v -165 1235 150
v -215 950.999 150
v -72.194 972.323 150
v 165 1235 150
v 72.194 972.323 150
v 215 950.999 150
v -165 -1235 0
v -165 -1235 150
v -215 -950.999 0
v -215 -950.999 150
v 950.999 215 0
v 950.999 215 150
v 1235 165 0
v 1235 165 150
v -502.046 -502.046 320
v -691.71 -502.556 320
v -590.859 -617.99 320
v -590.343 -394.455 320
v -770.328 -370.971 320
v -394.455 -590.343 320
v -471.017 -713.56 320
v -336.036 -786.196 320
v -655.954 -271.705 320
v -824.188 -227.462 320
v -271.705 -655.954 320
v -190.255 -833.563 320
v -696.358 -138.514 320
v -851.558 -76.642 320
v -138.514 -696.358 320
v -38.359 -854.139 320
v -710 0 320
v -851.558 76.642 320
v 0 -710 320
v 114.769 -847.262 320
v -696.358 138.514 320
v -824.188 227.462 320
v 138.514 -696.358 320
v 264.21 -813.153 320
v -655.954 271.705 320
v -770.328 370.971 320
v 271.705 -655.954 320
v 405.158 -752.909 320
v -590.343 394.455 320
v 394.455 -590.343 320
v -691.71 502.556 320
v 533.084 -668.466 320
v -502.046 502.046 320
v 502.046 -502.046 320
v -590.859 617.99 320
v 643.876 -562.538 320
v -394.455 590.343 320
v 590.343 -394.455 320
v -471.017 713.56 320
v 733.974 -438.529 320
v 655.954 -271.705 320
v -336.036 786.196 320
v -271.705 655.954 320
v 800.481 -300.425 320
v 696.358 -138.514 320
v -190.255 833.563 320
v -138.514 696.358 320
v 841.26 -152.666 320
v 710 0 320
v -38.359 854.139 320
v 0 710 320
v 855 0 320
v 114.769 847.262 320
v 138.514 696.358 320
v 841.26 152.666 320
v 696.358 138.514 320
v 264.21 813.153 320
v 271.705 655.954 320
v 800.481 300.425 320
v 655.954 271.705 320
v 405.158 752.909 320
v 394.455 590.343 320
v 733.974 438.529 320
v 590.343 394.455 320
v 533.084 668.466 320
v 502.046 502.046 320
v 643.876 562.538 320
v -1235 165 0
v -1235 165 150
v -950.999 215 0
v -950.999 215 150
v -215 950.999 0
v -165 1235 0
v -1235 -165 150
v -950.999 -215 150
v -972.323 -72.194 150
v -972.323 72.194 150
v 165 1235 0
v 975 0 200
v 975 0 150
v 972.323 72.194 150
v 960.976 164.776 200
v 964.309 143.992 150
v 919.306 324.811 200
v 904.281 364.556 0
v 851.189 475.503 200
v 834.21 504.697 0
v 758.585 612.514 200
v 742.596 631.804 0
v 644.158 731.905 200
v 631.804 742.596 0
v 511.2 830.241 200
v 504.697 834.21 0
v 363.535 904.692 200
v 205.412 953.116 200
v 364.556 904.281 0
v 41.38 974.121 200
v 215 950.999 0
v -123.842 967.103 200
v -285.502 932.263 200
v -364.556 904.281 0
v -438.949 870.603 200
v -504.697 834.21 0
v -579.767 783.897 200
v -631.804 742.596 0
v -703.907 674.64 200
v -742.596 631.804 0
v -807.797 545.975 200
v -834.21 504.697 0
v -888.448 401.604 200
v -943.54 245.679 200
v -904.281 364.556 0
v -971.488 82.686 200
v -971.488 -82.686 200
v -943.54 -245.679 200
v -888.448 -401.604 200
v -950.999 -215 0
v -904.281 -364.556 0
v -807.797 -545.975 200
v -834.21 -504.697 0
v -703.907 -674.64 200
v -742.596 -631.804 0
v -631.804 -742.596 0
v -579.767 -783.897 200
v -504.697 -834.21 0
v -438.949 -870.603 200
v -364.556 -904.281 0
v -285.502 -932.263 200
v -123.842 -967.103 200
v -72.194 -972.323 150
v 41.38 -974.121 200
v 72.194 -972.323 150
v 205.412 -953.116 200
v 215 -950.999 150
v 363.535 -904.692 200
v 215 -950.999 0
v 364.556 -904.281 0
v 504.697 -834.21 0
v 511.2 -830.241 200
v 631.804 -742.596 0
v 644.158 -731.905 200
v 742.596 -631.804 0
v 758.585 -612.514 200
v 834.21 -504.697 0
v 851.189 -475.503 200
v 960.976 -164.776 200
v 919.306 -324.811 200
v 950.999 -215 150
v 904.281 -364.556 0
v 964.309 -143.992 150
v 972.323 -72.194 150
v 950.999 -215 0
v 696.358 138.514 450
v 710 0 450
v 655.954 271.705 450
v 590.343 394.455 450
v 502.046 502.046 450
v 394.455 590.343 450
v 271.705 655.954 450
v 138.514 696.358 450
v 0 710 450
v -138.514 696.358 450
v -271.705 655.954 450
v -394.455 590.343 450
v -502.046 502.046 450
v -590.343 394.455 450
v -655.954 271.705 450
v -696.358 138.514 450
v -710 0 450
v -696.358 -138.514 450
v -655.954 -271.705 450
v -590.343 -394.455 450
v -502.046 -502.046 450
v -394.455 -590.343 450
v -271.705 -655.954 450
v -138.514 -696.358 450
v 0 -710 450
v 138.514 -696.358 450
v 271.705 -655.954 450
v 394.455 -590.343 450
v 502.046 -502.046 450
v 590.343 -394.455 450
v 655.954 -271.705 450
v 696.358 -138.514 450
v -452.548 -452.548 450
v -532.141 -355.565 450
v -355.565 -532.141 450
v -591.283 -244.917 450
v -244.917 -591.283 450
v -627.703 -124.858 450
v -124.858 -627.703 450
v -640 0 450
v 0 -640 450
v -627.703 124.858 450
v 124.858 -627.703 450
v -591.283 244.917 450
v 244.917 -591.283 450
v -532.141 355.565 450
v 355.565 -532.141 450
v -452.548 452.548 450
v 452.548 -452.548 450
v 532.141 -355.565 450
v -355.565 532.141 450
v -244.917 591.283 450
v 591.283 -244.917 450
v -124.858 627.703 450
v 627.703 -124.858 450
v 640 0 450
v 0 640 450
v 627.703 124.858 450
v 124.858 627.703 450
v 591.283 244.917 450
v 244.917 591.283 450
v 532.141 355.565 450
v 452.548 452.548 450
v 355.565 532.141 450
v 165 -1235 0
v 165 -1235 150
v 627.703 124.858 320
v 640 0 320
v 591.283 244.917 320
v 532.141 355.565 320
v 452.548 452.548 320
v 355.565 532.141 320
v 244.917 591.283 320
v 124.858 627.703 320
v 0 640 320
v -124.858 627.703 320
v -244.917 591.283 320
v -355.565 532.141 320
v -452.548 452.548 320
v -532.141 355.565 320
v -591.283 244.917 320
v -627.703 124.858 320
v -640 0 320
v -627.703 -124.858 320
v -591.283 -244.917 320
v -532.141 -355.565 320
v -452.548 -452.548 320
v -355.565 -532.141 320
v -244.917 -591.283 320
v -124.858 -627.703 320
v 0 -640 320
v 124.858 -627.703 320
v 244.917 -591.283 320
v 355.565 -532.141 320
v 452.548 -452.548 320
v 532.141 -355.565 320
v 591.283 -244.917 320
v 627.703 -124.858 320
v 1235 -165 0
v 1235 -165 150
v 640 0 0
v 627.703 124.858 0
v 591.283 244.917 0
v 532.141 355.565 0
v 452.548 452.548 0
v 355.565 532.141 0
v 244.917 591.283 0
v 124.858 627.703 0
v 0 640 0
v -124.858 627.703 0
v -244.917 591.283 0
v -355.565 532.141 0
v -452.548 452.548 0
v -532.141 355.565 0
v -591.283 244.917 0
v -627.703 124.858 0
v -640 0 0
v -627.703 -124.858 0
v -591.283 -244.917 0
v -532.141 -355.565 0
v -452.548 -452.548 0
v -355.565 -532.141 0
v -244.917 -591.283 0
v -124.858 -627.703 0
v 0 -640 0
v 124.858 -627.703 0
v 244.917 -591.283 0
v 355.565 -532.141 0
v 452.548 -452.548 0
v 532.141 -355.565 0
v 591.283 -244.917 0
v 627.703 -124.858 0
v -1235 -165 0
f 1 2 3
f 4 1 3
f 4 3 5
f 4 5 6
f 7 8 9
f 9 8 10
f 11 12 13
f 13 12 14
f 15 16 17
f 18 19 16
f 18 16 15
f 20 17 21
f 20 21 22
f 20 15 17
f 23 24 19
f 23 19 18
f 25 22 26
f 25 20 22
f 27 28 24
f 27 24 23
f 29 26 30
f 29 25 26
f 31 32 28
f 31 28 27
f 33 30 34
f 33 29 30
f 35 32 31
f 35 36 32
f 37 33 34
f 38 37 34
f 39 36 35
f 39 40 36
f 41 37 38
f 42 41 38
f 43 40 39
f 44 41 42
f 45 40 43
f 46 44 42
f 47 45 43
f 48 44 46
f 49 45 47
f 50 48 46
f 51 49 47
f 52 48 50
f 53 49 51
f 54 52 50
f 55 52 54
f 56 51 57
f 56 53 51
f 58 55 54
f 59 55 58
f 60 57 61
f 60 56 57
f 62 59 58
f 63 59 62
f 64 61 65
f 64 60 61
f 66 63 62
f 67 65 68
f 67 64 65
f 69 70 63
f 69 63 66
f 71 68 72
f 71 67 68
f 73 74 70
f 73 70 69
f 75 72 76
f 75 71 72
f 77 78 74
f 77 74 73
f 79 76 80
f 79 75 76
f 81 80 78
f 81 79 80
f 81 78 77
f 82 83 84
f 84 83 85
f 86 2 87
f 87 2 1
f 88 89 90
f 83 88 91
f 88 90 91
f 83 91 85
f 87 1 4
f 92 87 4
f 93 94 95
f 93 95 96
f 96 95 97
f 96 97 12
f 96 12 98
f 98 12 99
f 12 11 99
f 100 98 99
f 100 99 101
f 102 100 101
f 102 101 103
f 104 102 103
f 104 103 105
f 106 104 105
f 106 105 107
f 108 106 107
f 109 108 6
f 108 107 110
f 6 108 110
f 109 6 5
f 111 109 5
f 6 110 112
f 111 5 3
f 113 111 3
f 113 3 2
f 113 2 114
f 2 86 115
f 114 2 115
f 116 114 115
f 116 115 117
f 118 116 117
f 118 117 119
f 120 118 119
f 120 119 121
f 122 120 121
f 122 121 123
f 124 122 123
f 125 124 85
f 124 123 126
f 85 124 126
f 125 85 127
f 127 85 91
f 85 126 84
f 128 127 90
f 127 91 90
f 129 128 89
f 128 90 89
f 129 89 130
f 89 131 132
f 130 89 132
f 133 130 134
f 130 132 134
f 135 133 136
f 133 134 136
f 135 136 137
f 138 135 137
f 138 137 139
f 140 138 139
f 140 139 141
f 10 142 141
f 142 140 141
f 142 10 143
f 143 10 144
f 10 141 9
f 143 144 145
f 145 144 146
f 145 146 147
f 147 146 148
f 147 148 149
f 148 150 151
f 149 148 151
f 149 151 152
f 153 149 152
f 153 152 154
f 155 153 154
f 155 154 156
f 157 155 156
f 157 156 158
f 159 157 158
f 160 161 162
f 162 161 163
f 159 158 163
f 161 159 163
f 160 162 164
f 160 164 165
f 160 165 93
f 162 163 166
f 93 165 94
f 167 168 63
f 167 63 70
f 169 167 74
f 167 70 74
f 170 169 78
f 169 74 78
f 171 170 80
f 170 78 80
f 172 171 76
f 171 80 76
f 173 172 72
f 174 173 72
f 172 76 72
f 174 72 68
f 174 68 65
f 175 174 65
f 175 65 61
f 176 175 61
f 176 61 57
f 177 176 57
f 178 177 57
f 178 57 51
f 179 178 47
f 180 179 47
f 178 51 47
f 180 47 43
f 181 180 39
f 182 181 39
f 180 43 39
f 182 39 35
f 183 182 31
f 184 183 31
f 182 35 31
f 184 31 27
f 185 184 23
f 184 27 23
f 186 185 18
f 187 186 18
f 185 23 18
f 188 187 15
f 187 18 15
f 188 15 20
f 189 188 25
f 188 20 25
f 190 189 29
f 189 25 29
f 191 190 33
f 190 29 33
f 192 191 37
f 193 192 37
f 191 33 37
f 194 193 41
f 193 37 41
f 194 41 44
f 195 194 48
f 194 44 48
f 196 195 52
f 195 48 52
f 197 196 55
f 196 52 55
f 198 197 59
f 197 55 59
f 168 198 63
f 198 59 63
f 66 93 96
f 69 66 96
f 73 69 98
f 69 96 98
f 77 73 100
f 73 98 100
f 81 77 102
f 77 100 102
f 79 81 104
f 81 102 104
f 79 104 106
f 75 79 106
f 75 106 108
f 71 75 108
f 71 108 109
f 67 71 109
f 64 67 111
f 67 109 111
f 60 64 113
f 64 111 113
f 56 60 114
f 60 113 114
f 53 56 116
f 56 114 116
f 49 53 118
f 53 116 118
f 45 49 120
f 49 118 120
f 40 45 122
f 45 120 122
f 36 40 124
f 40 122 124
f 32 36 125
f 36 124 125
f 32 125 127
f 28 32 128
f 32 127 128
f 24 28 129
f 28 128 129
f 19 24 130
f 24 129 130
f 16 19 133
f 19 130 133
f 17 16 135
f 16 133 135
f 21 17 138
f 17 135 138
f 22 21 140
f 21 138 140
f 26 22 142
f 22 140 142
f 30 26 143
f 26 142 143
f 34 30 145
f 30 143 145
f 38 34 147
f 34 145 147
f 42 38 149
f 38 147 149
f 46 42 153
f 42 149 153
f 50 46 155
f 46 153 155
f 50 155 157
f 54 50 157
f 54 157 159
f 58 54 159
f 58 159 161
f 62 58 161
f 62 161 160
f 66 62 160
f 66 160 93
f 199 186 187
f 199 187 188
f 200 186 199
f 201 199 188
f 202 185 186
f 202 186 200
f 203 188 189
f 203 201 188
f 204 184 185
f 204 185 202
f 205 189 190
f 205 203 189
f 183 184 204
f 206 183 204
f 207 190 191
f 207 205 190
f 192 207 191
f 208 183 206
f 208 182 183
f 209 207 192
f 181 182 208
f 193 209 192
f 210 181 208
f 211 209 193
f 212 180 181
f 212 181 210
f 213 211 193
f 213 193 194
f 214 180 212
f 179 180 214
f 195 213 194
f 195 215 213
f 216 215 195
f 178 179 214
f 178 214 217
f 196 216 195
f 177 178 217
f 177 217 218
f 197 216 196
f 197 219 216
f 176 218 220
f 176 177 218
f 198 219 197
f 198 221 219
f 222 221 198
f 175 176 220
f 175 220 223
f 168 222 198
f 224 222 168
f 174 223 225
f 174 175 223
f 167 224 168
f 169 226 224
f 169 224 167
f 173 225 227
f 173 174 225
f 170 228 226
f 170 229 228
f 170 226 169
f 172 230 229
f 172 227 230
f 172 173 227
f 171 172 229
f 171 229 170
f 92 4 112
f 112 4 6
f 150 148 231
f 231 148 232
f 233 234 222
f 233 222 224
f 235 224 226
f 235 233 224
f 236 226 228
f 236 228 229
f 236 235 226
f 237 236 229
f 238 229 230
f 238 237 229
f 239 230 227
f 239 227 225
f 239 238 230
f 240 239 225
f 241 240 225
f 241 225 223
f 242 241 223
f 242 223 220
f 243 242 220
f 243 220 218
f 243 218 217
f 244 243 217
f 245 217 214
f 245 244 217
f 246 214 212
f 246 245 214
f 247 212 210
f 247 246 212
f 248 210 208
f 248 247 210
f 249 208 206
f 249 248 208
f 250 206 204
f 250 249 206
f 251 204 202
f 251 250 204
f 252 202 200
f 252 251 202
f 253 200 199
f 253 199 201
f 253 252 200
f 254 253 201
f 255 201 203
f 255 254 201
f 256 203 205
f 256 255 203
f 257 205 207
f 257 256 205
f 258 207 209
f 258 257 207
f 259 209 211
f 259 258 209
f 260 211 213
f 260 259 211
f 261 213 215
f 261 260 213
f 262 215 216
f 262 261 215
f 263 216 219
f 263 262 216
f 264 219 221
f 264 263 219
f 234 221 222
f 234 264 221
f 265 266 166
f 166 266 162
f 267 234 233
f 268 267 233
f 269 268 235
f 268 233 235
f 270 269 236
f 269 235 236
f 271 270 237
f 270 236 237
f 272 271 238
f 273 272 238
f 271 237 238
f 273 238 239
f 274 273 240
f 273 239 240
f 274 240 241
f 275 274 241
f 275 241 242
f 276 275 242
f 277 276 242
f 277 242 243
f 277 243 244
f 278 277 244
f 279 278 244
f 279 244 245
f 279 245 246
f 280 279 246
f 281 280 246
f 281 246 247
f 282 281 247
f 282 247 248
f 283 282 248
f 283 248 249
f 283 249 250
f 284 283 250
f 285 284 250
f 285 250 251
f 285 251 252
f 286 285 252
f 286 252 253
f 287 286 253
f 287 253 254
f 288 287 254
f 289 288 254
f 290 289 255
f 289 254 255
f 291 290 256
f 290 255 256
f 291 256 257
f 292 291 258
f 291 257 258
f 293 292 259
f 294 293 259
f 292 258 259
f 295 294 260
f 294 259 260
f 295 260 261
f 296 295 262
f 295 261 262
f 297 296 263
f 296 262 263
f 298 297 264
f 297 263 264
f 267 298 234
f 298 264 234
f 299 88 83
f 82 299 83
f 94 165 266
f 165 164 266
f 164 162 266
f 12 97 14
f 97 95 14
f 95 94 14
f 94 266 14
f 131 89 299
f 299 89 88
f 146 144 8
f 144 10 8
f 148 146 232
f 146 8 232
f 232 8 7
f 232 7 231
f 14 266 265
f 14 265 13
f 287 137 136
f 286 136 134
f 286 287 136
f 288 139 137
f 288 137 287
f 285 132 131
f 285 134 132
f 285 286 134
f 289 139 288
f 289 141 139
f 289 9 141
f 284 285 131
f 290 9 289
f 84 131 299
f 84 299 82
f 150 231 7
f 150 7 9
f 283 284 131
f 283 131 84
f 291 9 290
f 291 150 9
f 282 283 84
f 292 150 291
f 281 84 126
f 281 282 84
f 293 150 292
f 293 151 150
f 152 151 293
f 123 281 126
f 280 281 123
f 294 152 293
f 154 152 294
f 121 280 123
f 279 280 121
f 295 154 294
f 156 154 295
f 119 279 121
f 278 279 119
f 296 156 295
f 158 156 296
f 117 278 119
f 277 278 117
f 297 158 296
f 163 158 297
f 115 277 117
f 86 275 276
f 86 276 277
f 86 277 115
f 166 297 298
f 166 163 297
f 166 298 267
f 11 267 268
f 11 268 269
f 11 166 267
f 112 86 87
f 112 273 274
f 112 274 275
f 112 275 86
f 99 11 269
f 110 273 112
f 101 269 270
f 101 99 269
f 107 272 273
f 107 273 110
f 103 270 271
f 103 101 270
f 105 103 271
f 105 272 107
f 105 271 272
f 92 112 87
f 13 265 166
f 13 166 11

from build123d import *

# Parameters (mm, degrees)
F0_R      = 975
F1_DEPTH  = 320
F3_R      = 640
F4_DEPTH  = 320.001
F5_W      = 430
F5_H      = 150
F6_DEPTH  = 1235
F7_W      = 430
F7_H      = 150
F8_DEPTH  = 1235
F10_DEPTH = 150.001
F12_DEPTH = 150.001
F14_DEPTH = 150.001
F16_DEPTH = 150.001
F18_R     = 640
F19_DEPTH = 150.001
F20_R     = 710
F20_R_2   = 640
F21_DEPTH = 130
F22_SIZE  = 120


with BuildPart() as f1:
    # F0 (on Top) → F1 (new body)
    with BuildSketch(Plane.XY):
        Circle(F0_R)
    extrude(amount=F1_DEPTH)

    # F3 (on face) → F4 (cut, through all)
    with BuildSketch(Plane.XY.offset(320)):
        Circle(F3_R)
    extrude(amount=-F4_DEPTH, mode=Mode.SUBTRACT)

    # F5 (on Front) → F6 (join, symmetric)
    with BuildSketch(Plane.XZ):
        with Locations((0, 75)):
            Rectangle(F5_W, F5_H)
    extrude(amount=F6_DEPTH, both=True)

    # F7 (on Right) → F8 (join, symmetric)
    with BuildSketch(Plane.YZ):
        with Locations((0, 75)):
            Rectangle(F7_W, F7_H)
    extrude(amount=F8_DEPTH, both=True)

    # F9 (on face) → F10 (cut, through all)
    with BuildSketch(Plane.XY.offset(150)):
        Polygon((1235, -165), (950.999474, -215), (1235, -215), align=None)
        Polygon((950.999474, 215), (1235, 165), (1235, 215), align=None)
    extrude(amount=-F10_DEPTH, mode=Mode.SUBTRACT)

    # F11 (on face) → F12 (cut, through all)
    with BuildSketch(Plane.XY.offset(150)):
        Polygon((-165, -1235), (-215, -950.999474), (-215, -1235), align=None)
        Polygon((215, -950.999474), (165, -1235), (215, -1235), align=None)
    extrude(amount=-F12_DEPTH, mode=Mode.SUBTRACT)

    # F13 (on face) → F14 (cut, through all)
    with BuildSketch(Plane.XY.offset(150)):
        Polygon((215, 1235), (165, 1235), (215, 950.999474), align=None)
        Polygon((-215, 1235), (-215, 950.999474), (-165, 1235), align=None)
    extrude(amount=-F14_DEPTH, mode=Mode.SUBTRACT)

    # F15 (on face) → F16 (cut, through all)
    with BuildSketch(Plane.XY.offset(150)):
        Polygon((-1235, 165), (-950.999474, 215), (-1235, 215), align=None)
        Polygon((-950.999474, -215), (-1235, -165), (-1235, -215), align=None)
    extrude(amount=-F16_DEPTH, mode=Mode.SUBTRACT)

    # F18 (on face) → F19 (cut, through all)
    with BuildSketch(Plane.XY.offset(150)):
        Circle(F18_R)
    extrude(amount=-F19_DEPTH, mode=Mode.SUBTRACT)

    # F20 (on face) → F21 (join)
    with BuildSketch(Plane.XY.offset(320)):
        Circle(F20_R)
        Circle(F20_R_2, mode=Mode.SUBTRACT)
    extrude(amount=F21_DEPTH)

    # F22
    f22_edges = [f1.edges().sort_by_distance(p)[0] for p in [
        (-975, 0, 320),
    ]]
    chamfer(f22_edges, length=F22_SIZE)


solid = f1.part
